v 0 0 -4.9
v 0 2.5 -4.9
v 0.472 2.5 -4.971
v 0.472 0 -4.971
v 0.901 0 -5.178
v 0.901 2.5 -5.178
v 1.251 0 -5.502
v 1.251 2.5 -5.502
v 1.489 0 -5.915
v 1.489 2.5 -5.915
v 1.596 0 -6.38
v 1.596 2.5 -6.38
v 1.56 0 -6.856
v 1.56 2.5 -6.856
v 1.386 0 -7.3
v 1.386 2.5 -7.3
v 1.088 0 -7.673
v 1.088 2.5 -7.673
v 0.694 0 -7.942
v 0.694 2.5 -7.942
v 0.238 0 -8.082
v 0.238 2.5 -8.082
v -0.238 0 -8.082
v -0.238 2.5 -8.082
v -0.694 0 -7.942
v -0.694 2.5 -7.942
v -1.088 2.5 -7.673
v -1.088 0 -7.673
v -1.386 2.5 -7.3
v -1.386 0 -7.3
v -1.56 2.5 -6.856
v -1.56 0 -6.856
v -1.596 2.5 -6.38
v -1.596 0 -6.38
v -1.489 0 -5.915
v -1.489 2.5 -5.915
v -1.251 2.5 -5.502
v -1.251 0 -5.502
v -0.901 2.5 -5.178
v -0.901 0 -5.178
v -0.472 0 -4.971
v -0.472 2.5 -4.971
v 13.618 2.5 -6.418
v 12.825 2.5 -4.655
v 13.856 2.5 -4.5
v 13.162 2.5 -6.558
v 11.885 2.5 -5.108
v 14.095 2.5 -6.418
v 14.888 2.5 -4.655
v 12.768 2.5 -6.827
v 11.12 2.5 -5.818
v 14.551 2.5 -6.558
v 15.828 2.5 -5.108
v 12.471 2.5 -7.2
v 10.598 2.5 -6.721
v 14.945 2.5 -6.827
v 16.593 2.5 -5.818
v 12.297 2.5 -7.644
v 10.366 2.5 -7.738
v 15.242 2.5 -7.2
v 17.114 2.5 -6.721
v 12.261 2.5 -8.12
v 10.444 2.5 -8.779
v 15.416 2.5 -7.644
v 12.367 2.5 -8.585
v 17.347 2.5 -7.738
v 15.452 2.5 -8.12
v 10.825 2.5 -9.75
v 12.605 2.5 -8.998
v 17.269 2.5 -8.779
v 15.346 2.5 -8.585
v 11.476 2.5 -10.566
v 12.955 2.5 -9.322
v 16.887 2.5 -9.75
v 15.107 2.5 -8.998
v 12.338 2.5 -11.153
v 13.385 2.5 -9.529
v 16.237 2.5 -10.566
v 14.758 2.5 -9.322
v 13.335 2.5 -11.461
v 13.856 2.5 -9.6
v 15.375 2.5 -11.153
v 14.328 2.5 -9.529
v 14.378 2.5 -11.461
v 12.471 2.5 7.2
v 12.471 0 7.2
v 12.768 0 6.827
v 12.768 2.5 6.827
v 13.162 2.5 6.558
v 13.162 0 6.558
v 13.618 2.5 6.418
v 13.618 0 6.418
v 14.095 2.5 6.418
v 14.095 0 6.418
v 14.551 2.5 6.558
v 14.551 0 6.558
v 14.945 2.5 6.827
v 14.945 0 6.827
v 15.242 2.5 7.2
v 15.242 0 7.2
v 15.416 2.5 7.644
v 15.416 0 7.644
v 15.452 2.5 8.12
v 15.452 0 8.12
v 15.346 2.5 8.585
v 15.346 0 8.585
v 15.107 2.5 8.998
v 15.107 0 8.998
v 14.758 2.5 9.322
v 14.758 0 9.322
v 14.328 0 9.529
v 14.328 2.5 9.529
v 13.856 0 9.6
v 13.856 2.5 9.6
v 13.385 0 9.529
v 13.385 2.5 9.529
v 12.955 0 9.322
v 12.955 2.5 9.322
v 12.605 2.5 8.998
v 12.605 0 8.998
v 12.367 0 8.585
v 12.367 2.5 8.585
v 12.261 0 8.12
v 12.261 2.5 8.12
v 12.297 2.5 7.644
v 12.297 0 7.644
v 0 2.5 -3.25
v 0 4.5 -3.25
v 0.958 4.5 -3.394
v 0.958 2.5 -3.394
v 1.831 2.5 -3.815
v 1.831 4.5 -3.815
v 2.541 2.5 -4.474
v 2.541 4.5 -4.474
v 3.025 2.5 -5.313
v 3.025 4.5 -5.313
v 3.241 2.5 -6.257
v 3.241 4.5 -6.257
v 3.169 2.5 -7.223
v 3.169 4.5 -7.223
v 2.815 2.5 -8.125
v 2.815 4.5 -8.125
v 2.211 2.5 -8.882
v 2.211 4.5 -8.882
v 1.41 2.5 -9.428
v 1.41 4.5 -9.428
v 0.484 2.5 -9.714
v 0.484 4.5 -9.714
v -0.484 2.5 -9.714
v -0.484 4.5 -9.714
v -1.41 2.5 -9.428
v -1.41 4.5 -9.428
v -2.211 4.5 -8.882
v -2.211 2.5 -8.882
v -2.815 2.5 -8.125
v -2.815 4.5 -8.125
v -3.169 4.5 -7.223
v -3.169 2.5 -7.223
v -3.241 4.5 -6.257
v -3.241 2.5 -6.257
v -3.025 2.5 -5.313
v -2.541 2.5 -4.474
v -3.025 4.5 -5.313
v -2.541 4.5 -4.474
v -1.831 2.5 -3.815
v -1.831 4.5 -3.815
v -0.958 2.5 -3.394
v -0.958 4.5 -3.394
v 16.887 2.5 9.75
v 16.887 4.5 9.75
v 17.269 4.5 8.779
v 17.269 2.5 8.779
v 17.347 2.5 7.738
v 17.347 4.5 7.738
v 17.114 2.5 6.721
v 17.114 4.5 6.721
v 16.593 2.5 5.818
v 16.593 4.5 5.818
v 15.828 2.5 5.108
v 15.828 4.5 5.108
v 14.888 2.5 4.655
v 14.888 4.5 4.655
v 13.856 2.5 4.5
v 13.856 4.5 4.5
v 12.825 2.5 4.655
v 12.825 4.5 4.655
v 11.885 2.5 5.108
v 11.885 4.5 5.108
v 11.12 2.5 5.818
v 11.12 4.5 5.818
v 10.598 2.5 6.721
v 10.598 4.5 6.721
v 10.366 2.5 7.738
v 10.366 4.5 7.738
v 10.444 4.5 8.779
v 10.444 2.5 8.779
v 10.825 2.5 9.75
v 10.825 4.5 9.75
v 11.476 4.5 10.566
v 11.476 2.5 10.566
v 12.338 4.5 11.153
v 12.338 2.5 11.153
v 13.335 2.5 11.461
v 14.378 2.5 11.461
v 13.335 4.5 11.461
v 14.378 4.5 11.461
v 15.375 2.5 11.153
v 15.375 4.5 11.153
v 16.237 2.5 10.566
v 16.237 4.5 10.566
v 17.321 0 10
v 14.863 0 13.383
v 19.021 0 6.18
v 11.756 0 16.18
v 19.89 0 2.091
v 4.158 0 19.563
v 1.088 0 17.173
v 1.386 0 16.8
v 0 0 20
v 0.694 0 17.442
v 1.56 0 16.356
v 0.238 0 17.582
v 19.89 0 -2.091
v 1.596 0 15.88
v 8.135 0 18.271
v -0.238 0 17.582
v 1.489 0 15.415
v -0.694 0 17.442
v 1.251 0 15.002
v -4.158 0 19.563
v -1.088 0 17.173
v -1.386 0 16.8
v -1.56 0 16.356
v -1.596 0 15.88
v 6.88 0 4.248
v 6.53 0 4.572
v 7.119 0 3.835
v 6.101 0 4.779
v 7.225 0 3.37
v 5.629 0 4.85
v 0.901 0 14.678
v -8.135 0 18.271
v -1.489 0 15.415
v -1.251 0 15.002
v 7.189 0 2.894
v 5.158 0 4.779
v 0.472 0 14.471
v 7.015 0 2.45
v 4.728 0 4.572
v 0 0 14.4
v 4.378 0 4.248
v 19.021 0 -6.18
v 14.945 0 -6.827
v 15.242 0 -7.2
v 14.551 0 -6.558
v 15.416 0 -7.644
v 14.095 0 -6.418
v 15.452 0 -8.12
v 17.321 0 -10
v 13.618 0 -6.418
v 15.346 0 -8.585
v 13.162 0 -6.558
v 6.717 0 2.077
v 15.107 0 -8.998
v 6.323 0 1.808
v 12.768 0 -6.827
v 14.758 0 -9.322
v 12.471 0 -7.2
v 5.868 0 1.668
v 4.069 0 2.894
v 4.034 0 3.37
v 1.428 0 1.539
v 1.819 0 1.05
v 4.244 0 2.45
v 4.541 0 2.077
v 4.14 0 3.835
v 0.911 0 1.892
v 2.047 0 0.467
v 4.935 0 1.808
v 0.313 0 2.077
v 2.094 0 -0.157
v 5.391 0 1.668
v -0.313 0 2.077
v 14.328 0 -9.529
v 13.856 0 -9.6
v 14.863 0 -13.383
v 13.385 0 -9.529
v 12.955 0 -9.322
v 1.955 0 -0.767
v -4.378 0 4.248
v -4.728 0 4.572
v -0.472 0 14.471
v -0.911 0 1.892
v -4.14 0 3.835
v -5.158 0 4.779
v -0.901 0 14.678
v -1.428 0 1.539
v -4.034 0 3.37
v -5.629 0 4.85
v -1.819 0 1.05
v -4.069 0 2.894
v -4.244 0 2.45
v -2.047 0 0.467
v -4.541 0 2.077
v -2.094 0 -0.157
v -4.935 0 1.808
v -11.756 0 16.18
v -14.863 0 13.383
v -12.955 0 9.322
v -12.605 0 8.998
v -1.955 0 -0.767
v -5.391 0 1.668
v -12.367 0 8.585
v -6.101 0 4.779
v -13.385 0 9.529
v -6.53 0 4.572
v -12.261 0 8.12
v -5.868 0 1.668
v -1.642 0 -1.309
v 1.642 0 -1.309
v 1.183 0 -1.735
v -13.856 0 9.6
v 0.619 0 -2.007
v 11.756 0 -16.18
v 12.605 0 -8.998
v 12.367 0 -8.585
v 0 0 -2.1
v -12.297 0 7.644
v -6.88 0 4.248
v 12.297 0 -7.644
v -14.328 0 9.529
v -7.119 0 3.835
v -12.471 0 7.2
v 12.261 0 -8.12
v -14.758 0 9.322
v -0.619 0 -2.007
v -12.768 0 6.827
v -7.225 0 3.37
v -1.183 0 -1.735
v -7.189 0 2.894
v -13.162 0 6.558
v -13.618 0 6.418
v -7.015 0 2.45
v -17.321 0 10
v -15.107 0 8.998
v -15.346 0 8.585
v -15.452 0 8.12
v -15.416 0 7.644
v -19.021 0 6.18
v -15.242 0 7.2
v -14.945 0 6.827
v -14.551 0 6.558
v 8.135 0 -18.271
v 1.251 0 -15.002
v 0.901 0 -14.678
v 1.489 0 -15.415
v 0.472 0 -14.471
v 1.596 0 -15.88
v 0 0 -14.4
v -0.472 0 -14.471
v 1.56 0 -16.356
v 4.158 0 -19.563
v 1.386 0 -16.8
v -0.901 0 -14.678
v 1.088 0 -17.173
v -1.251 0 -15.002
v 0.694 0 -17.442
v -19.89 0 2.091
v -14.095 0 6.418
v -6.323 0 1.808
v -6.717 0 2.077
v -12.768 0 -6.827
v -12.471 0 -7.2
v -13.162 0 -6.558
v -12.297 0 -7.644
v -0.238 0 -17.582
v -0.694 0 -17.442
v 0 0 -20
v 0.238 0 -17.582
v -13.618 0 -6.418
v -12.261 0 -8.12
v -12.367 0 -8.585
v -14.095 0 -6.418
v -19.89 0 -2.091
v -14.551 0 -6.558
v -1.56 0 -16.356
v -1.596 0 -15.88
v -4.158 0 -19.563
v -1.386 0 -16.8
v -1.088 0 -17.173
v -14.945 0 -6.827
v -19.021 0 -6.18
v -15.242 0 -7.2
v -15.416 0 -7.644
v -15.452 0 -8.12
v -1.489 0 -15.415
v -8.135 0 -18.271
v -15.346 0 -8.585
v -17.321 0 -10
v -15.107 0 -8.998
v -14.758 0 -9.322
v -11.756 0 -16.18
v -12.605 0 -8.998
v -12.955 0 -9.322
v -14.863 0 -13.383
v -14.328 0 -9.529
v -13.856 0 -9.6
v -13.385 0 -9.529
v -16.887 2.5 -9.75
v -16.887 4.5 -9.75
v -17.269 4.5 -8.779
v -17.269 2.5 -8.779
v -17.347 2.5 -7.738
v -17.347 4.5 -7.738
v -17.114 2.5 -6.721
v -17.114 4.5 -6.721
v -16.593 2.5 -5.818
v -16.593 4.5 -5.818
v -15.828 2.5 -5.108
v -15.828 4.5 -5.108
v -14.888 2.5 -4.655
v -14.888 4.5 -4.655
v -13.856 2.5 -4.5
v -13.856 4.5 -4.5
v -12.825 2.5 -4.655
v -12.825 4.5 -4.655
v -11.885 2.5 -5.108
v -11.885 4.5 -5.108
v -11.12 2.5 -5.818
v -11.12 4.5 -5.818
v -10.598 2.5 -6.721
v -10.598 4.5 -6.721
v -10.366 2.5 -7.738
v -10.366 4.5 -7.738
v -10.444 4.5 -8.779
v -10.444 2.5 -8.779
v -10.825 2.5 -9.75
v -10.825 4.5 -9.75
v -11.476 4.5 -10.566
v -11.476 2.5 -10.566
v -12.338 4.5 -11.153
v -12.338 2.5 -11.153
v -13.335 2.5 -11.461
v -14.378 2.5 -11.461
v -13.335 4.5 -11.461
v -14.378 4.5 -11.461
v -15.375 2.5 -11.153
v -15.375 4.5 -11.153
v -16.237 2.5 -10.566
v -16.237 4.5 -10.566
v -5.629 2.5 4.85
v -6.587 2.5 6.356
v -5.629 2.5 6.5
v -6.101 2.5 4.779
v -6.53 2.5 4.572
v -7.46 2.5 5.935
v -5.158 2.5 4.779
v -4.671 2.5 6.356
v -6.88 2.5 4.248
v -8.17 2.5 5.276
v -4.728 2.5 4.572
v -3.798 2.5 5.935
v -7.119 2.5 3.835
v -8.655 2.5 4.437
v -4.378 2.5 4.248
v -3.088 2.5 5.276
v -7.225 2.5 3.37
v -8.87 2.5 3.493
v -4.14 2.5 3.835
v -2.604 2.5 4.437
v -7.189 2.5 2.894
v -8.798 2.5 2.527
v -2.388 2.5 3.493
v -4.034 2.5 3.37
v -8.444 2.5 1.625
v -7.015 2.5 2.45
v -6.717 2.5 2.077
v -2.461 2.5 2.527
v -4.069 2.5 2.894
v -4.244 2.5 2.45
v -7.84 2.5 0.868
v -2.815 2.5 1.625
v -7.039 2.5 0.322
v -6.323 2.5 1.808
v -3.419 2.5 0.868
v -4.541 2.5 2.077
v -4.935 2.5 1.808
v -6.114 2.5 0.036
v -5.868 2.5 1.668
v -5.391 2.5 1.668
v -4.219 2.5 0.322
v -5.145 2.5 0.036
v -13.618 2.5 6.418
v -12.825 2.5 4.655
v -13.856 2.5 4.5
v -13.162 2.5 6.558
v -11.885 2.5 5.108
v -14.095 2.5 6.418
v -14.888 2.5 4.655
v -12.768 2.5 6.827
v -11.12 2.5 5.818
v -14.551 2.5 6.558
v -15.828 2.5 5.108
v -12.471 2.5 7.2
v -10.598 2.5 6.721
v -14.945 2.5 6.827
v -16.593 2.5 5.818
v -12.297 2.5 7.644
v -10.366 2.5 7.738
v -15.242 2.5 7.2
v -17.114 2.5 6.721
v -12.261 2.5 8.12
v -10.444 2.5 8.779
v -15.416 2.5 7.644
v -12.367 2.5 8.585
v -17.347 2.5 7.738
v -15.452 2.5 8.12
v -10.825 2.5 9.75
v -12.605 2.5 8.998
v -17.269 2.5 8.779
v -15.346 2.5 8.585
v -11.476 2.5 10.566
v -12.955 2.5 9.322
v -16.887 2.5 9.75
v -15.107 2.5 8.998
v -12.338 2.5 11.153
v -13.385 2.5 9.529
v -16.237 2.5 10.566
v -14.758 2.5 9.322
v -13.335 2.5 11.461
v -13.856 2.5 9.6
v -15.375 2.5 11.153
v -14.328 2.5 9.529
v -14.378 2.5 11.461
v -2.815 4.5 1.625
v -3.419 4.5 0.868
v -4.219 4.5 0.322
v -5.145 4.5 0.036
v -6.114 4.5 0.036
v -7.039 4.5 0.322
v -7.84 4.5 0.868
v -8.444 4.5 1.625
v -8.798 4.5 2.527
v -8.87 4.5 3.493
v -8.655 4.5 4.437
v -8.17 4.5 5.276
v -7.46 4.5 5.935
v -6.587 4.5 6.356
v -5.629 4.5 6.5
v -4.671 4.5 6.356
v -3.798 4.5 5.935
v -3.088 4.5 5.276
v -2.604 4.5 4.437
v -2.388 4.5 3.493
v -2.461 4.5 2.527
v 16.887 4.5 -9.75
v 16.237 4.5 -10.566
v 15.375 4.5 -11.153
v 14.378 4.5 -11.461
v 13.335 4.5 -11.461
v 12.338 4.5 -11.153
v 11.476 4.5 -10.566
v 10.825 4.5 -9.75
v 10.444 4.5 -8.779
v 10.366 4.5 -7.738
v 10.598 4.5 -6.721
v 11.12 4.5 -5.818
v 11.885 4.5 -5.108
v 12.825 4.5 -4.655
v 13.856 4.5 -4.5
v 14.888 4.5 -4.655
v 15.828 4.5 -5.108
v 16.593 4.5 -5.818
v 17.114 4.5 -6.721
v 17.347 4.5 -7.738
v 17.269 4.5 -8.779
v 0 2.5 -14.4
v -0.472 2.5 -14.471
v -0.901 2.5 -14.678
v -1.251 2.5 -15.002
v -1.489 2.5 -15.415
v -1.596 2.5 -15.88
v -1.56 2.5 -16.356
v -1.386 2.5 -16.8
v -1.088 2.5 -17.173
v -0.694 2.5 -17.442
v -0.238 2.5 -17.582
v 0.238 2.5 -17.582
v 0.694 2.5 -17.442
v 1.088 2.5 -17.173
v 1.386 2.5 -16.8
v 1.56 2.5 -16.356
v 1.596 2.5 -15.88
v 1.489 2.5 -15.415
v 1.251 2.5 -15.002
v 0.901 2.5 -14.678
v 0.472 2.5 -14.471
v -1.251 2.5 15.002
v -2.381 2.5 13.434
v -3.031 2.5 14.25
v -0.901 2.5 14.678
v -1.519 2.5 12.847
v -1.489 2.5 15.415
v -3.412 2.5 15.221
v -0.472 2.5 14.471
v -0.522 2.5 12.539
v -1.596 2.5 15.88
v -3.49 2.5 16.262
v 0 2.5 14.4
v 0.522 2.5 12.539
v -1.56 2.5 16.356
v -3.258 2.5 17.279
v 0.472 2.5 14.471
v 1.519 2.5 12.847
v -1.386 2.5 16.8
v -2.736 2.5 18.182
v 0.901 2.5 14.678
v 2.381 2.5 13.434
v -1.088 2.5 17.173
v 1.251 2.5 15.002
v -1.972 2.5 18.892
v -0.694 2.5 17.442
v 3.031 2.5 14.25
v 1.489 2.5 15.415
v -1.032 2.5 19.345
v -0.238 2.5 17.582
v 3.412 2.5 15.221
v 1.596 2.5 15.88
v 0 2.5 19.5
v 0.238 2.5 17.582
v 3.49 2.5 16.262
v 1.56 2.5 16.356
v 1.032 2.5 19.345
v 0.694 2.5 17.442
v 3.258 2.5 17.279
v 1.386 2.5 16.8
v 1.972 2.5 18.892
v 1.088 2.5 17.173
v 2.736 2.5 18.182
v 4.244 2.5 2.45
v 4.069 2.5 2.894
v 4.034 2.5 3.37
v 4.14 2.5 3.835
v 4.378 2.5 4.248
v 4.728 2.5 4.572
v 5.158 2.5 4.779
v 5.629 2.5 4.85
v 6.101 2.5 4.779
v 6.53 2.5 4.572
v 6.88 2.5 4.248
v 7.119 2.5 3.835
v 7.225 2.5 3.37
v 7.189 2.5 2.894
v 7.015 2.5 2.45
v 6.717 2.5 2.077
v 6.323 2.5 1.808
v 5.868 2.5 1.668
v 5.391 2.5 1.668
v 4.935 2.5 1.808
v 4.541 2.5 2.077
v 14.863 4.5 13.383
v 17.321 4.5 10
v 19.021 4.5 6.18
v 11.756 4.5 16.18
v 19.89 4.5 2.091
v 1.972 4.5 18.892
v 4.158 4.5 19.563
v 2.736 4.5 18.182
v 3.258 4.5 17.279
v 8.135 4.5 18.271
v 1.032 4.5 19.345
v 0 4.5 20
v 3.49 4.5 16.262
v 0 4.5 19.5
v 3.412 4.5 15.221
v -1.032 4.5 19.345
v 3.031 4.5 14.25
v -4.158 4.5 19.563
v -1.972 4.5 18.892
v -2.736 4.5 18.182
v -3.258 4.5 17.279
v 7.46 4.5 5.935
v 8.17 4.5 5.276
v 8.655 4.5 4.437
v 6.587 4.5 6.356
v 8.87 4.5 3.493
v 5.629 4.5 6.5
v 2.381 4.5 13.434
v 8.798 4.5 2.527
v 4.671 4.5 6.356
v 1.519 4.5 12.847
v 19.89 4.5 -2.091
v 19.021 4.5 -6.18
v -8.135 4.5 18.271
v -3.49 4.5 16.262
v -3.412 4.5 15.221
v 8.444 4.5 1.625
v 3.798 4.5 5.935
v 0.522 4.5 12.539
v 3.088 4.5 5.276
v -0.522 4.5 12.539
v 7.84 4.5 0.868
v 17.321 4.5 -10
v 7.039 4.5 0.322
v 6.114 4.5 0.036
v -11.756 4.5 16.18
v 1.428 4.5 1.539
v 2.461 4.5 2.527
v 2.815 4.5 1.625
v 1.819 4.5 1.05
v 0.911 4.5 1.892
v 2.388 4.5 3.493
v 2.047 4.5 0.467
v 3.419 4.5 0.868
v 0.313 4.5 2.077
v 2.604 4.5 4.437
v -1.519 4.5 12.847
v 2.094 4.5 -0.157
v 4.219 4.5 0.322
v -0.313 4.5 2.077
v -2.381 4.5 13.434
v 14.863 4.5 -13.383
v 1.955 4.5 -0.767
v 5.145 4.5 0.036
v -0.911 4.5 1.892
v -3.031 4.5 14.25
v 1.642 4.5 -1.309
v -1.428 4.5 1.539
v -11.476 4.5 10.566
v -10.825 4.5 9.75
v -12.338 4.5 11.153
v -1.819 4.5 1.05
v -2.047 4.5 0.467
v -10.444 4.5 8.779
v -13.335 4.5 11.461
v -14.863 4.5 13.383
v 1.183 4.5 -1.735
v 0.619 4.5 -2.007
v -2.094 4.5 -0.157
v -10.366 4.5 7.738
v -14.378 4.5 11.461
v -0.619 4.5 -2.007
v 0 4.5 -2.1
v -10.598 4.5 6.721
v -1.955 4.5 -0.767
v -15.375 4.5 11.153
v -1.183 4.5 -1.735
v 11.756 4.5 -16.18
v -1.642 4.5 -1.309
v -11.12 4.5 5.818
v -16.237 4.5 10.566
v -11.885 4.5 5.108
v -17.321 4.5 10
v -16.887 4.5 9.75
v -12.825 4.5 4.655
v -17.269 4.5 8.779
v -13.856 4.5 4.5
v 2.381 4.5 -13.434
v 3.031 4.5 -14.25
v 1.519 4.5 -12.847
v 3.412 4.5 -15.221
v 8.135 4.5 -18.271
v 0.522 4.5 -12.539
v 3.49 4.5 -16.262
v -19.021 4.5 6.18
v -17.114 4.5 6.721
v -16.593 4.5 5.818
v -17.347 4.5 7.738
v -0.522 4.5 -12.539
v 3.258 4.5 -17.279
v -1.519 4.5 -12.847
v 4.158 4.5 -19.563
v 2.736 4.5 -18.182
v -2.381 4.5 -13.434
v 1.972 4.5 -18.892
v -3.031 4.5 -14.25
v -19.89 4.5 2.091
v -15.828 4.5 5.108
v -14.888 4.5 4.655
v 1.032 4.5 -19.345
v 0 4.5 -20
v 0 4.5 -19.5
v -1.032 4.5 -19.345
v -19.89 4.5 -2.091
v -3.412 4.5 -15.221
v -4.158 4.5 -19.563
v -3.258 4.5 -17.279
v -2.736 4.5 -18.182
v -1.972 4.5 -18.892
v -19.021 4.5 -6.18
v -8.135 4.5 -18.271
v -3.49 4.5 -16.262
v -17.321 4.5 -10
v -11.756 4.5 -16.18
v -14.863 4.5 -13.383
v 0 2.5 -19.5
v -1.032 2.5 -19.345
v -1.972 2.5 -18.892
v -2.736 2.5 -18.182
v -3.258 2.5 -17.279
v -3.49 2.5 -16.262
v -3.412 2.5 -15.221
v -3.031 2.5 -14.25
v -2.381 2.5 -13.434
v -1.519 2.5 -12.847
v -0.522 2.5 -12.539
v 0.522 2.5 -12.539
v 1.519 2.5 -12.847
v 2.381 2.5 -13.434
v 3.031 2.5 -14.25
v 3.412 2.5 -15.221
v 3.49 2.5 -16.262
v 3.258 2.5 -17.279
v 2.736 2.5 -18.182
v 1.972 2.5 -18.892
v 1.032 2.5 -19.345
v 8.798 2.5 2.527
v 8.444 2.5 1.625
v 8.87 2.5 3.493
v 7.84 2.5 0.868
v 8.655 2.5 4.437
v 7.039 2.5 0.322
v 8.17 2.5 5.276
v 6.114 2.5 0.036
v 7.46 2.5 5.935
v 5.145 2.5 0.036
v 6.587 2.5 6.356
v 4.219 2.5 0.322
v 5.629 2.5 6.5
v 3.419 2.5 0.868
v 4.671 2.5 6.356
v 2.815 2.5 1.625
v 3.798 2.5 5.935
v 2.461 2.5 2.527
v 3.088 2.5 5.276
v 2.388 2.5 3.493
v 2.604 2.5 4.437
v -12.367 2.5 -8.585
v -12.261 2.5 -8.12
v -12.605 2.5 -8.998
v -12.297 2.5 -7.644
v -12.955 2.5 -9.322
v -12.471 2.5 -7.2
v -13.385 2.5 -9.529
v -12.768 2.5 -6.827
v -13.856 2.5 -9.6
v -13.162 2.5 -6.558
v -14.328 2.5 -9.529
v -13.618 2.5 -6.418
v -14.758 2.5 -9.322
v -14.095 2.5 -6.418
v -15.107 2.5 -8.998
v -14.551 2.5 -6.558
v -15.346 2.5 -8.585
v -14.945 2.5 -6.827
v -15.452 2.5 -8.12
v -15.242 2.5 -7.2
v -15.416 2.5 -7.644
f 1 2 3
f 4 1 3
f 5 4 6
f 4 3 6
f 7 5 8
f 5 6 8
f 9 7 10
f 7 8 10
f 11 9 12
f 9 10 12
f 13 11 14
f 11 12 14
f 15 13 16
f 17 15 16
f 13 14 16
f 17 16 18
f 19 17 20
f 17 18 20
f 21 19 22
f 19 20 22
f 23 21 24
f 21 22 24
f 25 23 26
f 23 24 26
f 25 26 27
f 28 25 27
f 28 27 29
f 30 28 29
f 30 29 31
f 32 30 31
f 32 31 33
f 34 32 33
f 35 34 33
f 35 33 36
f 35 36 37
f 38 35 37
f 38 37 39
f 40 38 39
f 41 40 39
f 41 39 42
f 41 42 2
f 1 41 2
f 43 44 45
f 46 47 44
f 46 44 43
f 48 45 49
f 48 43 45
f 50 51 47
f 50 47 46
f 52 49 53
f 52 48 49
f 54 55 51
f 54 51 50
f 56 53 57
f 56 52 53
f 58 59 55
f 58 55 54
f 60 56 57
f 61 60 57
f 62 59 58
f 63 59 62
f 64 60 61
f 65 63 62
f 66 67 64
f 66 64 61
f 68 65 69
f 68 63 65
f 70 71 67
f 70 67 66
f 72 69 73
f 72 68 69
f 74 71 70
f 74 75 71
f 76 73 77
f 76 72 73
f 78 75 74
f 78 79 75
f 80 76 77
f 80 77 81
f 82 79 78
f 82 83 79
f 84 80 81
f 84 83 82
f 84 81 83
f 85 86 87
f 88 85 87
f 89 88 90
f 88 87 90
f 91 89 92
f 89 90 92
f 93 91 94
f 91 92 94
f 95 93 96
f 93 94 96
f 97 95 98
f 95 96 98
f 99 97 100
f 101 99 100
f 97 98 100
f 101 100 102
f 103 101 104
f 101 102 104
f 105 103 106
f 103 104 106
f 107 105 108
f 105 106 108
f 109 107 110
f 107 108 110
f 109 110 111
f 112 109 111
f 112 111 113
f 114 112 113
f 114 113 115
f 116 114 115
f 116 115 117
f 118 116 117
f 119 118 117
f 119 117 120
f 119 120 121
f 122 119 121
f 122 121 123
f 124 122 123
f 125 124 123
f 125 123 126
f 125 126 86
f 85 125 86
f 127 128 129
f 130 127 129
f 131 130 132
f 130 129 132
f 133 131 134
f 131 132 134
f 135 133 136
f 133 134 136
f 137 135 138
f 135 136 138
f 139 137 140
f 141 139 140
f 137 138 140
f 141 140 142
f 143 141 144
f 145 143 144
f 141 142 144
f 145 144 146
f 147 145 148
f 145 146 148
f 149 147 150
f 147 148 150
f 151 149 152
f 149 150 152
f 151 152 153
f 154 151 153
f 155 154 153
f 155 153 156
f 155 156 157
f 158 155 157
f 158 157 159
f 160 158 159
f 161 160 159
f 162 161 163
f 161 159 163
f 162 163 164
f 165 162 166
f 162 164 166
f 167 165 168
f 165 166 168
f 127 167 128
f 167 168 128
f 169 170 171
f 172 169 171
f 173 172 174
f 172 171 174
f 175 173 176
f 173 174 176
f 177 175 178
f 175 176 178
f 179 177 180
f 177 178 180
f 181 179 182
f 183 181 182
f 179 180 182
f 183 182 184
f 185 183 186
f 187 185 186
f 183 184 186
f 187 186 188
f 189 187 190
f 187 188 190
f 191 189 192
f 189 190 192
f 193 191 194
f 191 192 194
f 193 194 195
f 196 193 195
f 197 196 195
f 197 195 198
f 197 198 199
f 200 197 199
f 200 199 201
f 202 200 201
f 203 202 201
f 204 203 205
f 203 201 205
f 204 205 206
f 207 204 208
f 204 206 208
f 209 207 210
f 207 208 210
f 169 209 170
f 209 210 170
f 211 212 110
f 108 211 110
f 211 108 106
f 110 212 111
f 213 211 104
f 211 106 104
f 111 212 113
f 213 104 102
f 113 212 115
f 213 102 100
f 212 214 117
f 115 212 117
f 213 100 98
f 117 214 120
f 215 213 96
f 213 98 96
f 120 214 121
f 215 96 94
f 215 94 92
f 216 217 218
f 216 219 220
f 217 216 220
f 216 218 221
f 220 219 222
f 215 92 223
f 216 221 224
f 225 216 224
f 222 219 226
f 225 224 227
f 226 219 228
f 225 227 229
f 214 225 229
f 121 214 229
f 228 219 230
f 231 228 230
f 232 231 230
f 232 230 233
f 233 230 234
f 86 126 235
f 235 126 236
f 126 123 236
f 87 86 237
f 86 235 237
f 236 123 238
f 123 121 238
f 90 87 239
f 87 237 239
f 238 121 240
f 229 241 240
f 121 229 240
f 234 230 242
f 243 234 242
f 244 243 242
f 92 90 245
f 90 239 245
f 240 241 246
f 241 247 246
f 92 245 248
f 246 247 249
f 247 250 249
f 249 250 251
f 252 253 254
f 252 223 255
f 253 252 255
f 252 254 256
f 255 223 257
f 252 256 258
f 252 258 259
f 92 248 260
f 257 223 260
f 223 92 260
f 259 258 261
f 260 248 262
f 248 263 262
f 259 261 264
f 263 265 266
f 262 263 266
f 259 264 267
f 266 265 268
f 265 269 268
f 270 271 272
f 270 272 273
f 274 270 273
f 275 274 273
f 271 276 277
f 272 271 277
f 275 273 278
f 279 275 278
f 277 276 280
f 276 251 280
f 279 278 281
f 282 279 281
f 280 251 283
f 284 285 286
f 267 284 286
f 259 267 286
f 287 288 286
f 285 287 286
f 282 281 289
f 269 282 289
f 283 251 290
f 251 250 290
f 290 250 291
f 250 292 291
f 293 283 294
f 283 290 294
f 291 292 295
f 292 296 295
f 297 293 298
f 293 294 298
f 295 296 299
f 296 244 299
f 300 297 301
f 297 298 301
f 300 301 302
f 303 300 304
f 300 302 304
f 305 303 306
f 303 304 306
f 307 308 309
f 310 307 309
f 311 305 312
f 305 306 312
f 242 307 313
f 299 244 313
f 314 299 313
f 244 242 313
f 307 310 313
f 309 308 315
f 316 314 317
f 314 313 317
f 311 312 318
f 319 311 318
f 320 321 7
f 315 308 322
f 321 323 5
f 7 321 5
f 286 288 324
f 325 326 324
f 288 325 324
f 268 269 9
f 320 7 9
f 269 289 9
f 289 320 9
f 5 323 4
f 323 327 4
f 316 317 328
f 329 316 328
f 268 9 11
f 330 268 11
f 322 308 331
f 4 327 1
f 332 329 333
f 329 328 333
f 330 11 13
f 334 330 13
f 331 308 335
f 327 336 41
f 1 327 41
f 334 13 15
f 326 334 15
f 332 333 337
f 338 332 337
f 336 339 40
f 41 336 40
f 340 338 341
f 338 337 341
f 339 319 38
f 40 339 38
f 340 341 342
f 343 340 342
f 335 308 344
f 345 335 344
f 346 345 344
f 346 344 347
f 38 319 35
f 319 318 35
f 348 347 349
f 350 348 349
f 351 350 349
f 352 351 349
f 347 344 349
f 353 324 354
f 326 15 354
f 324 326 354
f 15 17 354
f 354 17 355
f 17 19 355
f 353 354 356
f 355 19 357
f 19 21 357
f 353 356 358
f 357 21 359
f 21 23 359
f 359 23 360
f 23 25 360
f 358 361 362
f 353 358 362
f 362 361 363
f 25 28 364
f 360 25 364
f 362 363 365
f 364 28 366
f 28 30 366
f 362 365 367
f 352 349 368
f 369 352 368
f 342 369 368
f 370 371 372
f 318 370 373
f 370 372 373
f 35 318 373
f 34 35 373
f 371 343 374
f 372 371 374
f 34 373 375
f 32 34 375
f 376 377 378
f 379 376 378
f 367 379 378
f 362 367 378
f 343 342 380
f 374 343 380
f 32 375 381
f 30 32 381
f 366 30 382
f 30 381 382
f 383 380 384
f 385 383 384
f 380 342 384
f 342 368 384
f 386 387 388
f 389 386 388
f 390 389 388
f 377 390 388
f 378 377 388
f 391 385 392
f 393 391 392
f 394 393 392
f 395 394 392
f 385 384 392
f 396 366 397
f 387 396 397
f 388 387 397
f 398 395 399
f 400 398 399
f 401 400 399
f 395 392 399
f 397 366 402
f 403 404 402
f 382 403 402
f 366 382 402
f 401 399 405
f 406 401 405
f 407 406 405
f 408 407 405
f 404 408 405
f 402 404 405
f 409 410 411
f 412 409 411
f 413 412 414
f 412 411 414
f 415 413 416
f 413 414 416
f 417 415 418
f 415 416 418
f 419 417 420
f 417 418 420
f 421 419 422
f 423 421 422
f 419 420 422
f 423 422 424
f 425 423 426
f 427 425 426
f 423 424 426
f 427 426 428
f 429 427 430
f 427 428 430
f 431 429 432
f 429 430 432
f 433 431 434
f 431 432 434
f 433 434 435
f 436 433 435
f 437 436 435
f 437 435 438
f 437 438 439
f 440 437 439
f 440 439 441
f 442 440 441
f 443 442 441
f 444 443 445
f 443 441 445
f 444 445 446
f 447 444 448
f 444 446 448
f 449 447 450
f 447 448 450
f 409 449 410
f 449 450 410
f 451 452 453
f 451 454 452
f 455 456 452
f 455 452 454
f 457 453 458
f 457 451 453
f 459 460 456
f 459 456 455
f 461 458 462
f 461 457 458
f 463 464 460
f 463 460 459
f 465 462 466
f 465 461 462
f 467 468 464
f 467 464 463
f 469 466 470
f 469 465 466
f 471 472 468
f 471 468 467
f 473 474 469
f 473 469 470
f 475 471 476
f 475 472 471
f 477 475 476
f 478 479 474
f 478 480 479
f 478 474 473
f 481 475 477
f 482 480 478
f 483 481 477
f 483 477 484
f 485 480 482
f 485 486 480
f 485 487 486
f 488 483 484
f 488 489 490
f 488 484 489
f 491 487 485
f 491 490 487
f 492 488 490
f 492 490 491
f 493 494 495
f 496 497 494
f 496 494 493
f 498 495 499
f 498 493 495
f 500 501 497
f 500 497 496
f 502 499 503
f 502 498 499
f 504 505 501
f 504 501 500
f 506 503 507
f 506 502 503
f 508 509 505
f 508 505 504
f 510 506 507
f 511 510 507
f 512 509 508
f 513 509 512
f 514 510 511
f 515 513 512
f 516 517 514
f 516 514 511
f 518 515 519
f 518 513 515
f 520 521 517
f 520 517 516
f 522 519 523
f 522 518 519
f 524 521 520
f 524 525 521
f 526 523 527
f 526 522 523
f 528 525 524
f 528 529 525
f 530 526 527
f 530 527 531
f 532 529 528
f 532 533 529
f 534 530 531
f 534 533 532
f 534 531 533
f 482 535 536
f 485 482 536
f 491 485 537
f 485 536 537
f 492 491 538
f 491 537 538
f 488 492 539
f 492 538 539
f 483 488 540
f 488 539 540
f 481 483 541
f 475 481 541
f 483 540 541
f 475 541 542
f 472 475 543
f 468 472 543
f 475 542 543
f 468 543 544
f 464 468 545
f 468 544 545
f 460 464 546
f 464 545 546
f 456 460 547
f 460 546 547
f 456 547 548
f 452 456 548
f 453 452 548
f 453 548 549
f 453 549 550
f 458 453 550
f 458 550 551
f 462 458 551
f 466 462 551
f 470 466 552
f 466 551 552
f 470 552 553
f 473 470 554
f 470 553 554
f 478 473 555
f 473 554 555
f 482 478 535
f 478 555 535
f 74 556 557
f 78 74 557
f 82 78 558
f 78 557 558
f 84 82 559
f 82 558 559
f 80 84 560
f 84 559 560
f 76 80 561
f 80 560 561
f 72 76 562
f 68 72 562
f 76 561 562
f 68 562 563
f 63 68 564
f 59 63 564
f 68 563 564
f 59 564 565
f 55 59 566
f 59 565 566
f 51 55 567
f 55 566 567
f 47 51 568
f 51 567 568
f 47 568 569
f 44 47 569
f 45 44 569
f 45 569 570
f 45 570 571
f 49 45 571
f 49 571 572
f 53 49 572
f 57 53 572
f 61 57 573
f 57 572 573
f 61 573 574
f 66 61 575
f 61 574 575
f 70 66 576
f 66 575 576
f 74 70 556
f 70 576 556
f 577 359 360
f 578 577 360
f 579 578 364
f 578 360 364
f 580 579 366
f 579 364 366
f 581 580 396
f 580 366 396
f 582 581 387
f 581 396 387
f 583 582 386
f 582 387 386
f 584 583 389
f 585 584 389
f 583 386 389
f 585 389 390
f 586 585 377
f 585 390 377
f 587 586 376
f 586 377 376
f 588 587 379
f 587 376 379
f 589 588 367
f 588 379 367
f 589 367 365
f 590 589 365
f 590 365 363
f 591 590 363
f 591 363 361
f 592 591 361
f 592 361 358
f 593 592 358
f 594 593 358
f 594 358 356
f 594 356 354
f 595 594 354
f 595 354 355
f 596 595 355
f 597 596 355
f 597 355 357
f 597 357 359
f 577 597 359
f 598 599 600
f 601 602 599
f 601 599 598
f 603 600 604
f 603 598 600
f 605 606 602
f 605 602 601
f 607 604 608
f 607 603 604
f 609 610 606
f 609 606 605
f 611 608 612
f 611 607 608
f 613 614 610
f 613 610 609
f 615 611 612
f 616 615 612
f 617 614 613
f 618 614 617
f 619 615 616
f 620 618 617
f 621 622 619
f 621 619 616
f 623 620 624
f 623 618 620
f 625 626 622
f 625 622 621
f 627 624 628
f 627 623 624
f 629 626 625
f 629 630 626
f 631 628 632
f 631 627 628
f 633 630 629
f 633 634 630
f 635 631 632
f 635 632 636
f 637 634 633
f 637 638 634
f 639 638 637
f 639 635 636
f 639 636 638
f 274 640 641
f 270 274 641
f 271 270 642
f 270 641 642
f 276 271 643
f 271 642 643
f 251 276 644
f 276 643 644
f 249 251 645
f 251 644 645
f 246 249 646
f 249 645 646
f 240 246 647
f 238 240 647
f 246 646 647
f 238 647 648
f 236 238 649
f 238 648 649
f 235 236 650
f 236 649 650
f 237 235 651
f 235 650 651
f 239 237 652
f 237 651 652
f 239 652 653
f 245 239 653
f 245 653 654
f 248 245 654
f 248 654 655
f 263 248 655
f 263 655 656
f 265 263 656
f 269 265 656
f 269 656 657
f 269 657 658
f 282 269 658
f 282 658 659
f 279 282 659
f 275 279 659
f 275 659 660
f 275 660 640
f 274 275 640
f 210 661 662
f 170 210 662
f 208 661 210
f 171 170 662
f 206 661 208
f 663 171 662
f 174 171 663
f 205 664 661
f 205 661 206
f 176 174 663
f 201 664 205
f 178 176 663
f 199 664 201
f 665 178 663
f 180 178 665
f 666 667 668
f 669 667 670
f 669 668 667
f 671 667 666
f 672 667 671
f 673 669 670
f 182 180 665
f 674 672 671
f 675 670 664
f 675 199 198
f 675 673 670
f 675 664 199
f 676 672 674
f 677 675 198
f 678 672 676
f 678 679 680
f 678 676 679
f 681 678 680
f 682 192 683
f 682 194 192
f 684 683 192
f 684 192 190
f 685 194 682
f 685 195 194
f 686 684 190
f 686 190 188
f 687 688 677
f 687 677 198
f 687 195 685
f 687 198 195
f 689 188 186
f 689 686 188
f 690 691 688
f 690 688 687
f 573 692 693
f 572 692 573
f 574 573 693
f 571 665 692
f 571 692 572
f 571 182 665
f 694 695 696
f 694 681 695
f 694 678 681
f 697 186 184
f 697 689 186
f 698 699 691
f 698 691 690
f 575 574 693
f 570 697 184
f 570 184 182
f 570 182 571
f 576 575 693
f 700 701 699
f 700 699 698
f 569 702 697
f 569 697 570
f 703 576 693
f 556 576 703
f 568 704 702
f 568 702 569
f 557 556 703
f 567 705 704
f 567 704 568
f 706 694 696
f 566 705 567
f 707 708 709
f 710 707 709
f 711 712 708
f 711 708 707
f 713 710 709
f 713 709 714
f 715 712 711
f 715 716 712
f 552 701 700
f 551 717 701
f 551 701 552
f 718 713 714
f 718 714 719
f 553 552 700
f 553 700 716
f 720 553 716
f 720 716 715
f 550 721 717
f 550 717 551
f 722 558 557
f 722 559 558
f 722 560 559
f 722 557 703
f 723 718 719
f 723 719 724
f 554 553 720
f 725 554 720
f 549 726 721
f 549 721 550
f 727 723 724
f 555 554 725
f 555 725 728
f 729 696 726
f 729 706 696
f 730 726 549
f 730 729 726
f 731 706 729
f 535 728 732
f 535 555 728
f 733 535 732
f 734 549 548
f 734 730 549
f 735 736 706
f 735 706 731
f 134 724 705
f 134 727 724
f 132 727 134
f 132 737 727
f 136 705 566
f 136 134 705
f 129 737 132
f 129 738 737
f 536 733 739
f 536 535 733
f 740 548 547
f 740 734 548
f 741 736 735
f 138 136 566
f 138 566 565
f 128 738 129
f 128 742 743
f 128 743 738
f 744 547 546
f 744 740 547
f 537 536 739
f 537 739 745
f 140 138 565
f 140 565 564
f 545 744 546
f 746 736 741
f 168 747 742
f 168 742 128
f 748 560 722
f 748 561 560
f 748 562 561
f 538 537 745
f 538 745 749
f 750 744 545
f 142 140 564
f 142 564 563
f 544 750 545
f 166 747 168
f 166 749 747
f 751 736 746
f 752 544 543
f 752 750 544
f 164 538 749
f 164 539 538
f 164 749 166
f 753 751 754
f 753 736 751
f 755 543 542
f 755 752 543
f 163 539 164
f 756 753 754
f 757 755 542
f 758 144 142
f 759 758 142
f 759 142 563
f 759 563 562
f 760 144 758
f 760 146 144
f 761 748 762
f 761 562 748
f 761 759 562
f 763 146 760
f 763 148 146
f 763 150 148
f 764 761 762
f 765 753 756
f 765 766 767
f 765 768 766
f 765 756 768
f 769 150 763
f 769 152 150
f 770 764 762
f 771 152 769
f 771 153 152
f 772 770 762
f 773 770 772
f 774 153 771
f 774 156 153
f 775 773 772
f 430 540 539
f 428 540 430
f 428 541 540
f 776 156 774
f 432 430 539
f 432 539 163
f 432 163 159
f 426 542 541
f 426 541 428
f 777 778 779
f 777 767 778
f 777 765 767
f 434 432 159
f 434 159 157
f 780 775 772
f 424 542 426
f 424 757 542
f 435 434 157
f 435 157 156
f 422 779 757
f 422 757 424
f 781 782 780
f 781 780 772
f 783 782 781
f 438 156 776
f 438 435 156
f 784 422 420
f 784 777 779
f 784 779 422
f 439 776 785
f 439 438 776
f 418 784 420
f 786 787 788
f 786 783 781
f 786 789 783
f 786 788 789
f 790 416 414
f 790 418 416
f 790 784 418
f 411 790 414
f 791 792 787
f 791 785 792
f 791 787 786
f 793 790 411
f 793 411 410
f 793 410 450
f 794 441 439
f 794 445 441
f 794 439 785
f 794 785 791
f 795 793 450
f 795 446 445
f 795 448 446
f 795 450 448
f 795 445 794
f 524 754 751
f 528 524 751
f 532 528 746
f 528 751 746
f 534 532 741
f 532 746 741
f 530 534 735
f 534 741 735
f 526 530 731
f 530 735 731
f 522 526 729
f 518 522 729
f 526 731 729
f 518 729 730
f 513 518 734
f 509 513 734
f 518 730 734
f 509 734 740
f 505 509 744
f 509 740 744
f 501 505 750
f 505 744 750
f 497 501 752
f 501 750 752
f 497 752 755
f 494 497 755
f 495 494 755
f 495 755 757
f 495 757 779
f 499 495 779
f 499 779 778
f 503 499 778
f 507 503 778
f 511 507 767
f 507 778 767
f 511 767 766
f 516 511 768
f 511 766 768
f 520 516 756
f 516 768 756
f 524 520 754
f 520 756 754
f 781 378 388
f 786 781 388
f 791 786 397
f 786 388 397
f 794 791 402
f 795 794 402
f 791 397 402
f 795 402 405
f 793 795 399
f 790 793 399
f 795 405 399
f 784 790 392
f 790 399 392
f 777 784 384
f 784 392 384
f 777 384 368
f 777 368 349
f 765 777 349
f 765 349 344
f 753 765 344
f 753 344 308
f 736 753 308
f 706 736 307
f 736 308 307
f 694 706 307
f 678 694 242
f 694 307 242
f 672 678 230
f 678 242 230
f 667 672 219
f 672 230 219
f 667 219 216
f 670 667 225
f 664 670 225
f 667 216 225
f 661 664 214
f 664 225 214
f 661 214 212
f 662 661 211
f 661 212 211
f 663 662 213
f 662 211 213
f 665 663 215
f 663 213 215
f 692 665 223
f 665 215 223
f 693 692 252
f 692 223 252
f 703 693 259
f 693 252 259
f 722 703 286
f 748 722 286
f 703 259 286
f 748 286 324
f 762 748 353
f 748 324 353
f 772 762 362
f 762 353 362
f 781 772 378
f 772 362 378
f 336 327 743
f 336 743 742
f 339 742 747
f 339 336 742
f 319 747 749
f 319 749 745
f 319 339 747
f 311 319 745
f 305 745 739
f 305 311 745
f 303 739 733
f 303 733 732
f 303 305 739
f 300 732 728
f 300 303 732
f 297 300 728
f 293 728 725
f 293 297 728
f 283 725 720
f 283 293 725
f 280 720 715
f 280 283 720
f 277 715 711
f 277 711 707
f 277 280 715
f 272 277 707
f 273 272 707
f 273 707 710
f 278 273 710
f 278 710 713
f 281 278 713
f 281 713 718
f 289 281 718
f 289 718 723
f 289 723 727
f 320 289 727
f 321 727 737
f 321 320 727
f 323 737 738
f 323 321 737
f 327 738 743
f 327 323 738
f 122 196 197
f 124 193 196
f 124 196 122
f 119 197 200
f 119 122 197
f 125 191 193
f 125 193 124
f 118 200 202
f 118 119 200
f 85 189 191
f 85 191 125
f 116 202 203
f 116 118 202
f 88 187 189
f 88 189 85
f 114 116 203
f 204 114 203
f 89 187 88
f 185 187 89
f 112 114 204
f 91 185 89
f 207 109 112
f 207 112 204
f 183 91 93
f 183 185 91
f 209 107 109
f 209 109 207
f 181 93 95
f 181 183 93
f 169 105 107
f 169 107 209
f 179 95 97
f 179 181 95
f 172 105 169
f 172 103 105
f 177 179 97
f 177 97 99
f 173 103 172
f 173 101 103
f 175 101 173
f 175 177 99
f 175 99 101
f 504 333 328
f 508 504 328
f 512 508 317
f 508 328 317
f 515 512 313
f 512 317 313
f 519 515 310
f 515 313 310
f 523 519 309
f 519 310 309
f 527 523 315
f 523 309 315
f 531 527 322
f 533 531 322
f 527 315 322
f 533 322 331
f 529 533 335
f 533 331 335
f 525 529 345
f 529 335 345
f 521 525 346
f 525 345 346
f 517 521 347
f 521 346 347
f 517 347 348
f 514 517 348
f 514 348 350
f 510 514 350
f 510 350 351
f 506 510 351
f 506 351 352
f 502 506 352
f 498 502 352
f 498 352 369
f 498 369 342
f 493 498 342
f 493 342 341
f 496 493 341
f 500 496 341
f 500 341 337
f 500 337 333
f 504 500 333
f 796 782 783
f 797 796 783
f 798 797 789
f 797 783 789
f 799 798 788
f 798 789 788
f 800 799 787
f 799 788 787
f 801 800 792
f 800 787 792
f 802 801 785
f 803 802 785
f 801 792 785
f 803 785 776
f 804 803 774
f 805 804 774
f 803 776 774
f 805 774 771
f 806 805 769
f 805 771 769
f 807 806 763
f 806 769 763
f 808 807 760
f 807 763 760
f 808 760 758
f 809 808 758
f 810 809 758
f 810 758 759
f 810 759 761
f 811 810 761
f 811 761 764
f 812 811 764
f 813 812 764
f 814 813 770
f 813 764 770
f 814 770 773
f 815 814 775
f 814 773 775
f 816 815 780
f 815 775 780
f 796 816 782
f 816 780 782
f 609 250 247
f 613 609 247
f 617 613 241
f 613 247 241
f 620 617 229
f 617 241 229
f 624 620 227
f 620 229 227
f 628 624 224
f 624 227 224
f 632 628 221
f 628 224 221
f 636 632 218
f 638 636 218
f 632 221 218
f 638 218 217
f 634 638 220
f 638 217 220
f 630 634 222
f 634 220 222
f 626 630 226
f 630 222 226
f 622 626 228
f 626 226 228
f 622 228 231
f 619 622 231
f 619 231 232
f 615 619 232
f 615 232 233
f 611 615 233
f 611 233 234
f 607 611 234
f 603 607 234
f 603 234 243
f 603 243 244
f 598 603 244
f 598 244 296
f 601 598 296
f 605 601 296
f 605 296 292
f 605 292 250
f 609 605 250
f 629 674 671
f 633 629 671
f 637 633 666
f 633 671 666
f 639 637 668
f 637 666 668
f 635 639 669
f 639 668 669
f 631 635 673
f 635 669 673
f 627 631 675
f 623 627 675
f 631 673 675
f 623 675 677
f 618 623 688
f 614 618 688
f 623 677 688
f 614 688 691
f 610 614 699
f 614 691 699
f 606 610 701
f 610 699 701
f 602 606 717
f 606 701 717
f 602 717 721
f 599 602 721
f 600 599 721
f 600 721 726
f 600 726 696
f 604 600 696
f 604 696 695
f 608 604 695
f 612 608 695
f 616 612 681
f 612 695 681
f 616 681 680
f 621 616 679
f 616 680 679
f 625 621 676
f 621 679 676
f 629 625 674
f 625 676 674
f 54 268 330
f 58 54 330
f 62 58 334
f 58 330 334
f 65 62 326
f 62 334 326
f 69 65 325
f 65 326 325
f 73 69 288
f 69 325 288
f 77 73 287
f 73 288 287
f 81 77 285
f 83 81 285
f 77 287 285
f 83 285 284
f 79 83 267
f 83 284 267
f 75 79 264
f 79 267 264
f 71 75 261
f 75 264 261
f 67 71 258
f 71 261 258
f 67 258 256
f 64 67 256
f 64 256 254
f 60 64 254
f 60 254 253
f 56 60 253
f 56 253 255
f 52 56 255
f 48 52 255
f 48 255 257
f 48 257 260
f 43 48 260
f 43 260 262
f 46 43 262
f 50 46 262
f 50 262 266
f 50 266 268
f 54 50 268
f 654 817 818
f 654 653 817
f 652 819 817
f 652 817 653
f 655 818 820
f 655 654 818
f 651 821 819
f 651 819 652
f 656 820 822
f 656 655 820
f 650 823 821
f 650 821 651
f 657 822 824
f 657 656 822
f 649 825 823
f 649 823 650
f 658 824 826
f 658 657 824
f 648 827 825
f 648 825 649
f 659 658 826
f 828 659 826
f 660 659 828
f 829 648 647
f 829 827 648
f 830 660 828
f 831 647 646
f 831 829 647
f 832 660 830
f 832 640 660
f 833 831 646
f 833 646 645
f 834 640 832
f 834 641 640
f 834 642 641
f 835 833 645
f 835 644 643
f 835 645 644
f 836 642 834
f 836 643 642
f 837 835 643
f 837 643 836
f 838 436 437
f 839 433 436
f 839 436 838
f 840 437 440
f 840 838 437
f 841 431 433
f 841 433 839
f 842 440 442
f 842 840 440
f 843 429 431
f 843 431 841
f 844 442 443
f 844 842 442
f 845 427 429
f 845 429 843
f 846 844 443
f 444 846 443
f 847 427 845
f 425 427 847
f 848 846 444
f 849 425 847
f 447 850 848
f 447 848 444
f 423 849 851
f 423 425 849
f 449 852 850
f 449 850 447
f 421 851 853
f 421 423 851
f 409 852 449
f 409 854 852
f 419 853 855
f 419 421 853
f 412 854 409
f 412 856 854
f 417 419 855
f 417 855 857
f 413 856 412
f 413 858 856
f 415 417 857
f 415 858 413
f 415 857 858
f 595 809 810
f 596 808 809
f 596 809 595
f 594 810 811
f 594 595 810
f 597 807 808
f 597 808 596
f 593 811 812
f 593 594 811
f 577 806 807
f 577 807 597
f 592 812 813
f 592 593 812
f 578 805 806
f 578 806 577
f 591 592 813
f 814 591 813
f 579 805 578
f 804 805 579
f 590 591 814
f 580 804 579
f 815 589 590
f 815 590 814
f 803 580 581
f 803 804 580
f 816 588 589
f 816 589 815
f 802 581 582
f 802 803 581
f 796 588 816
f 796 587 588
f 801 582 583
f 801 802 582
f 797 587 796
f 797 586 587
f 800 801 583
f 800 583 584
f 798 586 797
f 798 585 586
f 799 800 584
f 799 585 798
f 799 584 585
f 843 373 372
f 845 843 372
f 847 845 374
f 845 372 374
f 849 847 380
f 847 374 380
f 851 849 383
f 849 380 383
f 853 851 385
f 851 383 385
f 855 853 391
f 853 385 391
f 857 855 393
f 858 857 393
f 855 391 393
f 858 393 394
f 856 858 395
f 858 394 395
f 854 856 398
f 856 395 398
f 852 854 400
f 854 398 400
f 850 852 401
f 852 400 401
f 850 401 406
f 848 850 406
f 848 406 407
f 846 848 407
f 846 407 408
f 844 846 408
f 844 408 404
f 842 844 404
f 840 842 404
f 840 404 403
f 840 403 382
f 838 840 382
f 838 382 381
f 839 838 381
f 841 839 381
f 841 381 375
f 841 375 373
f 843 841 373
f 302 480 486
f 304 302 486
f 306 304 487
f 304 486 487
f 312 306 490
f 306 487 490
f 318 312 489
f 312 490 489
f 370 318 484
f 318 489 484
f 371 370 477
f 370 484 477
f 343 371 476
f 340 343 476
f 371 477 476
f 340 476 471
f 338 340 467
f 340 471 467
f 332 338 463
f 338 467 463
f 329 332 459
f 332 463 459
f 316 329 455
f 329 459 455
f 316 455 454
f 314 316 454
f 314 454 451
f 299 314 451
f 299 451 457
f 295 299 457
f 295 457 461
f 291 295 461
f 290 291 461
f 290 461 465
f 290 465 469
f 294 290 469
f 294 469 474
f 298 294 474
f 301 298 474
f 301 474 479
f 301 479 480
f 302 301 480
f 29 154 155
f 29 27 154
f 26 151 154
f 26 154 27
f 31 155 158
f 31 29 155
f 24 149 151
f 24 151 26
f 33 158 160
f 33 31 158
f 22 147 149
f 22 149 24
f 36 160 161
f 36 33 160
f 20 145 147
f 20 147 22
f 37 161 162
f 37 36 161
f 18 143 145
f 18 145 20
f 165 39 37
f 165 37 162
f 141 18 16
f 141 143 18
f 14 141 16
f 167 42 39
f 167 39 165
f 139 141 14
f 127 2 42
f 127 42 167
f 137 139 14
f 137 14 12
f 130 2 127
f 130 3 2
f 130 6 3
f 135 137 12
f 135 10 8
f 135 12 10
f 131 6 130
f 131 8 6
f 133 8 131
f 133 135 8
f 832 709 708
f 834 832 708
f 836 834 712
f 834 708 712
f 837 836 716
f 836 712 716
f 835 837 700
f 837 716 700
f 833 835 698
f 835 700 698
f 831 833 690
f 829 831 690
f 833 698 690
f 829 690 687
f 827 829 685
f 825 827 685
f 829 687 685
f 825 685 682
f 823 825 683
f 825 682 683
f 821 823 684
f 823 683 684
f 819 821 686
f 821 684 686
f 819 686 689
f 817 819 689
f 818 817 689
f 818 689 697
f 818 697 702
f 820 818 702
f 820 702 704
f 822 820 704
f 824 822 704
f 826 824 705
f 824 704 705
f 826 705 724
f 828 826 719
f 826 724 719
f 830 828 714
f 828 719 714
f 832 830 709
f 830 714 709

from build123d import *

# Parameters (mm, degrees)
SKETCH1_R           = 20
SKETCH1_R_2         = 2.1
BOSS_EXTRUDE1_DEPTH = 4.5
SKETCH2_R           = 1.6
CUT_EXTRUDE1_DEPTH  = 29.640006983
SKETCH5_R           = 3.5
CUT_EXTRUDE4_DEPTH  = 2
CIRPATTERN1_COUNT   = 6
SKETCH3_R           = 1.6
CUT_EXTRUDE2_DEPTH  = 29.640006983
SKETCH4_R           = 3.25
CUT_EXTRUDE3_DEPTH  = 2
CIRPATTERN2_COUNT   = 3


with BuildPart() as part:
    # Sketch1 → Boss-Extrude1 (new body)
    with BuildSketch(Plane(origin=(0, 0, 0), x_dir=(1, 0, 0), z_dir=(0, 1, 0))):
        with Locations(Location((0, 0, 0), (0, 0, 90))):
            Circle(SKETCH1_R)
        with Locations(Location((0, 0, 0), (0, 0, 90))):
            Circle(SKETCH1_R_2, mode=Mode.SUBTRACT)
    extrude(amount=BOSS_EXTRUDE1_DEPTH)

    # Sketch2 → Cut-Extrude1 (cut, through all)
    with BuildSketch(Plane.XZ):
        with Locations(Location((0, 16, 0), (0, 0, 270))):
            Circle(SKETCH2_R)
    cut_extrude1 = extrude(amount=-CUT_EXTRUDE1_DEPTH, mode=Mode.SUBTRACT)

    # Sketch5 → Cut-Extrude4 (cut)
    with BuildSketch(Plane(origin=(0, 4.5, 0), x_dir=(1, 0, 0), z_dir=(0, 1, 0))):
        with Locations(Location((0, -16, 0), (0, 0, 270))):
            Circle(SKETCH5_R)
    cut_extrude4 = extrude(amount=-CUT_EXTRUDE4_DEPTH, mode=Mode.SUBTRACT)

    # CirPattern1: Cut-Extrude1, Cut-Extrude4 ×6 about axis
    cirpattern1_axis = Axis((0, 0, 0), (0, 1, 0))
    add([cut_extrude1.rotate(cirpattern1_axis, i * 360 / CIRPATTERN1_COUNT) for i in range(1, CIRPATTERN1_COUNT)], mode=Mode.SUBTRACT)
    add([cut_extrude4.rotate(cirpattern1_axis, i * 360 / CIRPATTERN1_COUNT) for i in range(1, CIRPATTERN1_COUNT)], mode=Mode.SUBTRACT)

    # Sketch3 → Cut-Extrude2 (cut, through all)
    with BuildSketch(Plane(origin=(0, 4.5, 0), x_dir=(1, 0, 0), z_dir=(0, 1, 0))):
        with Locations(Location((0, 6.5, 0), (0, 0, 270))):
            Circle(SKETCH3_R)
    cut_extrude2 = extrude(amount=-CUT_EXTRUDE2_DEPTH, mode=Mode.SUBTRACT)

    # Sketch4 → Cut-Extrude3 (cut)
    with BuildSketch(Plane(origin=(0, 4.5, 0), x_dir=(1, 0, 0), z_dir=(0, 1, 0))):
        with Locations(Location((0, 6.5, 0), (0, 0, 270))):
            Circle(SKETCH4_R)
    cut_extrude3 = extrude(amount=-CUT_EXTRUDE3_DEPTH, mode=Mode.SUBTRACT)

    # CirPattern2: Cut-Extrude2, Cut-Extrude3 ×3 about axis
    cirpattern2_axis = Axis((0, 0, 0), (0, 1, 0))
    add([cut_extrude2.rotate(cirpattern2_axis, i * 360 / CIRPATTERN2_COUNT) for i in range(1, CIRPATTERN2_COUNT)], mode=Mode.SUBTRACT)
    add([cut_extrude3.rotate(cirpattern2_axis, i * 360 / CIRPATTERN2_COUNT) for i in range(1, CIRPATTERN2_COUNT)], mode=Mode.SUBTRACT)


solid = part.part
